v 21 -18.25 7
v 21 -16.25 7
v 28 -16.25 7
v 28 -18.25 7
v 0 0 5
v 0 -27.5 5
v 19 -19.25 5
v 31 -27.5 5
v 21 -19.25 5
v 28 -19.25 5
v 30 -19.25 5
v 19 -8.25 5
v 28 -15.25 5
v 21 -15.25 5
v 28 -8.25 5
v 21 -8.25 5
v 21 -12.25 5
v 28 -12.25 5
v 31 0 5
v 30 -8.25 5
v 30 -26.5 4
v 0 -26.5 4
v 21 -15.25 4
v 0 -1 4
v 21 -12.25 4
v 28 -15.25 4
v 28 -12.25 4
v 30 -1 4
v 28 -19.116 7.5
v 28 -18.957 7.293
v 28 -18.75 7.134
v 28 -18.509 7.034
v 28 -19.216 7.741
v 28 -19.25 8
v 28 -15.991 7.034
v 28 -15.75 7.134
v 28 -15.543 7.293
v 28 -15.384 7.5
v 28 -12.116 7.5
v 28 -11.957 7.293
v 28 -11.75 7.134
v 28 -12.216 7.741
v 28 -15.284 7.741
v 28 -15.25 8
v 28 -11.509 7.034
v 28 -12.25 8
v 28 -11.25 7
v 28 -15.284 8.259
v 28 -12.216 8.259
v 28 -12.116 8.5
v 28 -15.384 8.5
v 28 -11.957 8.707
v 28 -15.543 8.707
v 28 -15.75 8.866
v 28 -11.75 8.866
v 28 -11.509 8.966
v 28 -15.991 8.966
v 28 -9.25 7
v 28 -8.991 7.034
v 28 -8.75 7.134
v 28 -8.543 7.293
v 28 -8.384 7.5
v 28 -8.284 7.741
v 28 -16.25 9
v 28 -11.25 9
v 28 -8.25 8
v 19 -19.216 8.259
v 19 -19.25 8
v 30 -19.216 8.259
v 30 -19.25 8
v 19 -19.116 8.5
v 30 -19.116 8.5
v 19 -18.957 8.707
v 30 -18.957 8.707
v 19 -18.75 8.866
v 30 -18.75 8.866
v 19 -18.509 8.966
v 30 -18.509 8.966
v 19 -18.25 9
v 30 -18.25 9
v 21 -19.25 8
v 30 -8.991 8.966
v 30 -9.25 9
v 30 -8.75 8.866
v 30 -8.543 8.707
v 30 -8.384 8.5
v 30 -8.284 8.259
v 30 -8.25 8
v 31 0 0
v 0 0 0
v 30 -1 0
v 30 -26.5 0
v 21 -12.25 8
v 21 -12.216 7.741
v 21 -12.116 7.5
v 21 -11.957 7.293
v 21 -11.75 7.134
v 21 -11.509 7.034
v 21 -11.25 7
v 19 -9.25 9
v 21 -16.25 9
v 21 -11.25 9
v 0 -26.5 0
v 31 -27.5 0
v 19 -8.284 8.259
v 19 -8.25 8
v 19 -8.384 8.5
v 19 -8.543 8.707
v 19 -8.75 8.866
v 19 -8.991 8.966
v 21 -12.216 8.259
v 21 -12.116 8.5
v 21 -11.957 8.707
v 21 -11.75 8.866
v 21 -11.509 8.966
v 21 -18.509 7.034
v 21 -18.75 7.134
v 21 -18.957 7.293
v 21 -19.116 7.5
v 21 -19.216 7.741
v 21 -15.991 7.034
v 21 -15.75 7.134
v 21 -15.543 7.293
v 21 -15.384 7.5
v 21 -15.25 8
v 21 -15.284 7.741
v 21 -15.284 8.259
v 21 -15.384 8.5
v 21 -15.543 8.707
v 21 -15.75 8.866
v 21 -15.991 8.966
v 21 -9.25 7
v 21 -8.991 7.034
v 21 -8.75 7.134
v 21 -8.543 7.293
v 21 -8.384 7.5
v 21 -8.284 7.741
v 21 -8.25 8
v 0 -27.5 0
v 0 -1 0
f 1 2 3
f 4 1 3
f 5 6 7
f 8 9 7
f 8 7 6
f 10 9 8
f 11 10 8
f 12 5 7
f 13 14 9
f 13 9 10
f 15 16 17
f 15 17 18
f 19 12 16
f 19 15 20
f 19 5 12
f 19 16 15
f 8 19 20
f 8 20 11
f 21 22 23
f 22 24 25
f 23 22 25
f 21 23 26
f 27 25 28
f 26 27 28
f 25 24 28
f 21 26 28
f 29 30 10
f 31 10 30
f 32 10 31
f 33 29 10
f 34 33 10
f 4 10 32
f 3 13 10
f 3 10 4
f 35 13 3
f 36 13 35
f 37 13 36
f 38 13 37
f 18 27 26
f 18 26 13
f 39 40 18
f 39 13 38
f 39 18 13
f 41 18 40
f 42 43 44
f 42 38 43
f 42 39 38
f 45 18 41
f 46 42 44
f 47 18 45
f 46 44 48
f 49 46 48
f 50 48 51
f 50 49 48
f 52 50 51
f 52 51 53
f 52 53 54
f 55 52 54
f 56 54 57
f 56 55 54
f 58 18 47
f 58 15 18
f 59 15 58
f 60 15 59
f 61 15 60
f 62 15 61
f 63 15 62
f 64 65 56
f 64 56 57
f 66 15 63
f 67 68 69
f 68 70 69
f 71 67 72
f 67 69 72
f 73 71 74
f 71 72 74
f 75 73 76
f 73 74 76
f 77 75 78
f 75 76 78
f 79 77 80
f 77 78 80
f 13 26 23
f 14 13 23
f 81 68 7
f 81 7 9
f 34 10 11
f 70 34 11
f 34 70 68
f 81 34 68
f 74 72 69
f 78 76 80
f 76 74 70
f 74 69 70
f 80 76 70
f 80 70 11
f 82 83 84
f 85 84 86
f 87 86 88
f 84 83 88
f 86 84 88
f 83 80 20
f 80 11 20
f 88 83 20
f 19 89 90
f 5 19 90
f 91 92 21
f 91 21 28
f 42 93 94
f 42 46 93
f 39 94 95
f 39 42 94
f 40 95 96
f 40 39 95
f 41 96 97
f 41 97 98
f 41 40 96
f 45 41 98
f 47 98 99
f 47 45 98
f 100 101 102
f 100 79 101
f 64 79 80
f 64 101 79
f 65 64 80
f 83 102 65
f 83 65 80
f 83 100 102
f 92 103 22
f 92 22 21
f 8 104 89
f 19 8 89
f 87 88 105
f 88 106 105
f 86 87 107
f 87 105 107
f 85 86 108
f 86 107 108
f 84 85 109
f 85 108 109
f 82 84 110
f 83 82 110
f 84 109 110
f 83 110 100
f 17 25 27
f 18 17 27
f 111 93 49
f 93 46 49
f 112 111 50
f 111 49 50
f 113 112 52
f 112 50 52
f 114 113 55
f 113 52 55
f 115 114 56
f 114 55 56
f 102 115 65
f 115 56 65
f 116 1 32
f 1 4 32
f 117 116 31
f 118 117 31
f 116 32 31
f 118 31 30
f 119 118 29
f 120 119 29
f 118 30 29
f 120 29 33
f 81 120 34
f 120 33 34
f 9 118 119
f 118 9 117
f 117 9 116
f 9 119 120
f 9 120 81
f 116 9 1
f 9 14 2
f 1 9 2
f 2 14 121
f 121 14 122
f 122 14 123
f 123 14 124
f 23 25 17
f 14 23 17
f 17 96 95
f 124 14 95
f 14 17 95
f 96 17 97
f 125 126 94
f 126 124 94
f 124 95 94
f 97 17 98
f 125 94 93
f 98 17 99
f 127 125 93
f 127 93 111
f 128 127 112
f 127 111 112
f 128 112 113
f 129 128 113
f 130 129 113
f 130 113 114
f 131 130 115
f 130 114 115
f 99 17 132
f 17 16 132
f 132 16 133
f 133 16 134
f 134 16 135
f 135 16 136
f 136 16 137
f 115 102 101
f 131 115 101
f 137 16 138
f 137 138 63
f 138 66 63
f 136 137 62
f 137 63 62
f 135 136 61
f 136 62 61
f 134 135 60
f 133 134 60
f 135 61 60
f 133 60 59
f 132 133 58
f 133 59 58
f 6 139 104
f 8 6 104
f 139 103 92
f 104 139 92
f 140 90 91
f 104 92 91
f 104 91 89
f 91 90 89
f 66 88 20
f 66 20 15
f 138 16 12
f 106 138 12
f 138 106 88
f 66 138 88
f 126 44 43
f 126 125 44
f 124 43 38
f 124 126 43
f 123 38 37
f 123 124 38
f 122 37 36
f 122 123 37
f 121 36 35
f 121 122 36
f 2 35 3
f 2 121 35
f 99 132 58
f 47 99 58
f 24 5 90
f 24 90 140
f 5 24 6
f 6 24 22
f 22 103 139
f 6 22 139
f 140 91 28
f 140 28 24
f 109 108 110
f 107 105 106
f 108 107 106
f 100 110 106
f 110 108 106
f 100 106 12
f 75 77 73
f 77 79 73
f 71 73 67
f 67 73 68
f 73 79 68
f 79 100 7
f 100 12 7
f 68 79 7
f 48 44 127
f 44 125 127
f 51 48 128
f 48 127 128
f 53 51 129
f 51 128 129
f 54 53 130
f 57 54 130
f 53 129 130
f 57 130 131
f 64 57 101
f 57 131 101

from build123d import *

# Parameters (mm, degrees)
F0_W     = 30
F0_H     = 1
F1_DEPTH = 5
F2_DEPTH = 9
F3_DEPTH = 4
F4_W     = 3.5
F4_H     = 2
F5_DEPTH = 25
F6_R     = 0.99999


# Not quite as in the source:
# - a fillet or chamfer is up to 0.001 mm smaller than in the source, because OpenCascade refuses the exact size


with BuildPart() as f1:
    # F0 (on Top) → F1 (new body)
    with BuildSketch(Plane.XY):
        with Locations((15, -0.5)):
            Rectangle(F0_W, F0_H)
        Polygon((31, 0), (30, 0), (30, -1), (30, -8.25), (30, -13.75), (30, -19.25), (30, -26.5), (30, -27.5), (31, -27.5), align=None)
        with Locations((15, -27)):
            Rectangle(F0_W, F0_H)
        Polygon((30, -1), (0, -1), (0, -13.75), (19, -13.75), (19, -8.25), (30, -8.25), align=None)
        Polygon((19, -13.75), (0, -13.75), (0, -26.5), (30, -26.5), (30, -19.25), (19, -19.25), align=None)
    extrude(amount=F1_DEPTH)

    # F0 (on Top) → F2 (join)
    with BuildSketch(Plane.XY):
        Polygon((30, -13.75), (30, -8.25), (19, -8.25), (19, -13.75), (21, -13.75), (21, -12.25), (28, -12.25), (28, -13.75), align=None)
        Polygon((21, -13.75), (19, -13.75), (19, -19.25), (30, -19.25), (30, -13.75), (28, -13.75), (28, -15.25), (21, -15.25), align=None)
    extrude(amount=F2_DEPTH)

    # F0 (on Top) → F3 (cut)
    with BuildSketch(Plane.XY):
        Polygon((30, -1), (0, -1), (0, -13.75), (19, -13.75), (19, -8.25), (30, -8.25), align=None)
        Polygon((19, -13.75), (0, -13.75), (0, -26.5), (30, -26.5), (30, -19.25), (19, -19.25), align=None)
        Polygon((21, -13.75), (19, -13.75), (19, -19.25), (30, -19.25), (30, -13.75), (28, -13.75), (28, -15.25), (21, -15.25), align=None)
        Polygon((30, -13.75), (30, -8.25), (19, -8.25), (19, -13.75), (21, -13.75), (21, -12.25), (28, -12.25), (28, -13.75), align=None)
    extrude(amount=F3_DEPTH, mode=Mode.SUBTRACT)

    # F4 (on face) → F5 (cut)
    with BuildSketch(Plane(origin=(0, -8.25, 0), x_dir=(-1, 0, 0), z_dir=(0, 1, 0))):
        with Locations((-26.25, 6)):
            Rectangle(F4_W, F4_H)
        with Locations((-22.75, 6)):
            Rectangle(F4_W, F4_H)
    extrude(amount=-F5_DEPTH, mode=Mode.SUBTRACT)

    # F6 (radius 1 in the source; OpenCascade refuses exactly that, so slightly less here)
    f6_edges = [f1.edges().sort_by_distance(p)[0] for p in [
        (24.5, -19.25, 9),
        (24.5, -12.25, 9),
        (24.5, -12.25, 7),
        (24.5, -8.25, 9),
        (24.5, -15.25, 9),
        (24.5, -15.25, 7),
        (24.5, -19.25, 7),
        (24.5, -8.25, 7),
    ]]
    fillet(f6_edges, radius=F6_R)


solid = f1.part
